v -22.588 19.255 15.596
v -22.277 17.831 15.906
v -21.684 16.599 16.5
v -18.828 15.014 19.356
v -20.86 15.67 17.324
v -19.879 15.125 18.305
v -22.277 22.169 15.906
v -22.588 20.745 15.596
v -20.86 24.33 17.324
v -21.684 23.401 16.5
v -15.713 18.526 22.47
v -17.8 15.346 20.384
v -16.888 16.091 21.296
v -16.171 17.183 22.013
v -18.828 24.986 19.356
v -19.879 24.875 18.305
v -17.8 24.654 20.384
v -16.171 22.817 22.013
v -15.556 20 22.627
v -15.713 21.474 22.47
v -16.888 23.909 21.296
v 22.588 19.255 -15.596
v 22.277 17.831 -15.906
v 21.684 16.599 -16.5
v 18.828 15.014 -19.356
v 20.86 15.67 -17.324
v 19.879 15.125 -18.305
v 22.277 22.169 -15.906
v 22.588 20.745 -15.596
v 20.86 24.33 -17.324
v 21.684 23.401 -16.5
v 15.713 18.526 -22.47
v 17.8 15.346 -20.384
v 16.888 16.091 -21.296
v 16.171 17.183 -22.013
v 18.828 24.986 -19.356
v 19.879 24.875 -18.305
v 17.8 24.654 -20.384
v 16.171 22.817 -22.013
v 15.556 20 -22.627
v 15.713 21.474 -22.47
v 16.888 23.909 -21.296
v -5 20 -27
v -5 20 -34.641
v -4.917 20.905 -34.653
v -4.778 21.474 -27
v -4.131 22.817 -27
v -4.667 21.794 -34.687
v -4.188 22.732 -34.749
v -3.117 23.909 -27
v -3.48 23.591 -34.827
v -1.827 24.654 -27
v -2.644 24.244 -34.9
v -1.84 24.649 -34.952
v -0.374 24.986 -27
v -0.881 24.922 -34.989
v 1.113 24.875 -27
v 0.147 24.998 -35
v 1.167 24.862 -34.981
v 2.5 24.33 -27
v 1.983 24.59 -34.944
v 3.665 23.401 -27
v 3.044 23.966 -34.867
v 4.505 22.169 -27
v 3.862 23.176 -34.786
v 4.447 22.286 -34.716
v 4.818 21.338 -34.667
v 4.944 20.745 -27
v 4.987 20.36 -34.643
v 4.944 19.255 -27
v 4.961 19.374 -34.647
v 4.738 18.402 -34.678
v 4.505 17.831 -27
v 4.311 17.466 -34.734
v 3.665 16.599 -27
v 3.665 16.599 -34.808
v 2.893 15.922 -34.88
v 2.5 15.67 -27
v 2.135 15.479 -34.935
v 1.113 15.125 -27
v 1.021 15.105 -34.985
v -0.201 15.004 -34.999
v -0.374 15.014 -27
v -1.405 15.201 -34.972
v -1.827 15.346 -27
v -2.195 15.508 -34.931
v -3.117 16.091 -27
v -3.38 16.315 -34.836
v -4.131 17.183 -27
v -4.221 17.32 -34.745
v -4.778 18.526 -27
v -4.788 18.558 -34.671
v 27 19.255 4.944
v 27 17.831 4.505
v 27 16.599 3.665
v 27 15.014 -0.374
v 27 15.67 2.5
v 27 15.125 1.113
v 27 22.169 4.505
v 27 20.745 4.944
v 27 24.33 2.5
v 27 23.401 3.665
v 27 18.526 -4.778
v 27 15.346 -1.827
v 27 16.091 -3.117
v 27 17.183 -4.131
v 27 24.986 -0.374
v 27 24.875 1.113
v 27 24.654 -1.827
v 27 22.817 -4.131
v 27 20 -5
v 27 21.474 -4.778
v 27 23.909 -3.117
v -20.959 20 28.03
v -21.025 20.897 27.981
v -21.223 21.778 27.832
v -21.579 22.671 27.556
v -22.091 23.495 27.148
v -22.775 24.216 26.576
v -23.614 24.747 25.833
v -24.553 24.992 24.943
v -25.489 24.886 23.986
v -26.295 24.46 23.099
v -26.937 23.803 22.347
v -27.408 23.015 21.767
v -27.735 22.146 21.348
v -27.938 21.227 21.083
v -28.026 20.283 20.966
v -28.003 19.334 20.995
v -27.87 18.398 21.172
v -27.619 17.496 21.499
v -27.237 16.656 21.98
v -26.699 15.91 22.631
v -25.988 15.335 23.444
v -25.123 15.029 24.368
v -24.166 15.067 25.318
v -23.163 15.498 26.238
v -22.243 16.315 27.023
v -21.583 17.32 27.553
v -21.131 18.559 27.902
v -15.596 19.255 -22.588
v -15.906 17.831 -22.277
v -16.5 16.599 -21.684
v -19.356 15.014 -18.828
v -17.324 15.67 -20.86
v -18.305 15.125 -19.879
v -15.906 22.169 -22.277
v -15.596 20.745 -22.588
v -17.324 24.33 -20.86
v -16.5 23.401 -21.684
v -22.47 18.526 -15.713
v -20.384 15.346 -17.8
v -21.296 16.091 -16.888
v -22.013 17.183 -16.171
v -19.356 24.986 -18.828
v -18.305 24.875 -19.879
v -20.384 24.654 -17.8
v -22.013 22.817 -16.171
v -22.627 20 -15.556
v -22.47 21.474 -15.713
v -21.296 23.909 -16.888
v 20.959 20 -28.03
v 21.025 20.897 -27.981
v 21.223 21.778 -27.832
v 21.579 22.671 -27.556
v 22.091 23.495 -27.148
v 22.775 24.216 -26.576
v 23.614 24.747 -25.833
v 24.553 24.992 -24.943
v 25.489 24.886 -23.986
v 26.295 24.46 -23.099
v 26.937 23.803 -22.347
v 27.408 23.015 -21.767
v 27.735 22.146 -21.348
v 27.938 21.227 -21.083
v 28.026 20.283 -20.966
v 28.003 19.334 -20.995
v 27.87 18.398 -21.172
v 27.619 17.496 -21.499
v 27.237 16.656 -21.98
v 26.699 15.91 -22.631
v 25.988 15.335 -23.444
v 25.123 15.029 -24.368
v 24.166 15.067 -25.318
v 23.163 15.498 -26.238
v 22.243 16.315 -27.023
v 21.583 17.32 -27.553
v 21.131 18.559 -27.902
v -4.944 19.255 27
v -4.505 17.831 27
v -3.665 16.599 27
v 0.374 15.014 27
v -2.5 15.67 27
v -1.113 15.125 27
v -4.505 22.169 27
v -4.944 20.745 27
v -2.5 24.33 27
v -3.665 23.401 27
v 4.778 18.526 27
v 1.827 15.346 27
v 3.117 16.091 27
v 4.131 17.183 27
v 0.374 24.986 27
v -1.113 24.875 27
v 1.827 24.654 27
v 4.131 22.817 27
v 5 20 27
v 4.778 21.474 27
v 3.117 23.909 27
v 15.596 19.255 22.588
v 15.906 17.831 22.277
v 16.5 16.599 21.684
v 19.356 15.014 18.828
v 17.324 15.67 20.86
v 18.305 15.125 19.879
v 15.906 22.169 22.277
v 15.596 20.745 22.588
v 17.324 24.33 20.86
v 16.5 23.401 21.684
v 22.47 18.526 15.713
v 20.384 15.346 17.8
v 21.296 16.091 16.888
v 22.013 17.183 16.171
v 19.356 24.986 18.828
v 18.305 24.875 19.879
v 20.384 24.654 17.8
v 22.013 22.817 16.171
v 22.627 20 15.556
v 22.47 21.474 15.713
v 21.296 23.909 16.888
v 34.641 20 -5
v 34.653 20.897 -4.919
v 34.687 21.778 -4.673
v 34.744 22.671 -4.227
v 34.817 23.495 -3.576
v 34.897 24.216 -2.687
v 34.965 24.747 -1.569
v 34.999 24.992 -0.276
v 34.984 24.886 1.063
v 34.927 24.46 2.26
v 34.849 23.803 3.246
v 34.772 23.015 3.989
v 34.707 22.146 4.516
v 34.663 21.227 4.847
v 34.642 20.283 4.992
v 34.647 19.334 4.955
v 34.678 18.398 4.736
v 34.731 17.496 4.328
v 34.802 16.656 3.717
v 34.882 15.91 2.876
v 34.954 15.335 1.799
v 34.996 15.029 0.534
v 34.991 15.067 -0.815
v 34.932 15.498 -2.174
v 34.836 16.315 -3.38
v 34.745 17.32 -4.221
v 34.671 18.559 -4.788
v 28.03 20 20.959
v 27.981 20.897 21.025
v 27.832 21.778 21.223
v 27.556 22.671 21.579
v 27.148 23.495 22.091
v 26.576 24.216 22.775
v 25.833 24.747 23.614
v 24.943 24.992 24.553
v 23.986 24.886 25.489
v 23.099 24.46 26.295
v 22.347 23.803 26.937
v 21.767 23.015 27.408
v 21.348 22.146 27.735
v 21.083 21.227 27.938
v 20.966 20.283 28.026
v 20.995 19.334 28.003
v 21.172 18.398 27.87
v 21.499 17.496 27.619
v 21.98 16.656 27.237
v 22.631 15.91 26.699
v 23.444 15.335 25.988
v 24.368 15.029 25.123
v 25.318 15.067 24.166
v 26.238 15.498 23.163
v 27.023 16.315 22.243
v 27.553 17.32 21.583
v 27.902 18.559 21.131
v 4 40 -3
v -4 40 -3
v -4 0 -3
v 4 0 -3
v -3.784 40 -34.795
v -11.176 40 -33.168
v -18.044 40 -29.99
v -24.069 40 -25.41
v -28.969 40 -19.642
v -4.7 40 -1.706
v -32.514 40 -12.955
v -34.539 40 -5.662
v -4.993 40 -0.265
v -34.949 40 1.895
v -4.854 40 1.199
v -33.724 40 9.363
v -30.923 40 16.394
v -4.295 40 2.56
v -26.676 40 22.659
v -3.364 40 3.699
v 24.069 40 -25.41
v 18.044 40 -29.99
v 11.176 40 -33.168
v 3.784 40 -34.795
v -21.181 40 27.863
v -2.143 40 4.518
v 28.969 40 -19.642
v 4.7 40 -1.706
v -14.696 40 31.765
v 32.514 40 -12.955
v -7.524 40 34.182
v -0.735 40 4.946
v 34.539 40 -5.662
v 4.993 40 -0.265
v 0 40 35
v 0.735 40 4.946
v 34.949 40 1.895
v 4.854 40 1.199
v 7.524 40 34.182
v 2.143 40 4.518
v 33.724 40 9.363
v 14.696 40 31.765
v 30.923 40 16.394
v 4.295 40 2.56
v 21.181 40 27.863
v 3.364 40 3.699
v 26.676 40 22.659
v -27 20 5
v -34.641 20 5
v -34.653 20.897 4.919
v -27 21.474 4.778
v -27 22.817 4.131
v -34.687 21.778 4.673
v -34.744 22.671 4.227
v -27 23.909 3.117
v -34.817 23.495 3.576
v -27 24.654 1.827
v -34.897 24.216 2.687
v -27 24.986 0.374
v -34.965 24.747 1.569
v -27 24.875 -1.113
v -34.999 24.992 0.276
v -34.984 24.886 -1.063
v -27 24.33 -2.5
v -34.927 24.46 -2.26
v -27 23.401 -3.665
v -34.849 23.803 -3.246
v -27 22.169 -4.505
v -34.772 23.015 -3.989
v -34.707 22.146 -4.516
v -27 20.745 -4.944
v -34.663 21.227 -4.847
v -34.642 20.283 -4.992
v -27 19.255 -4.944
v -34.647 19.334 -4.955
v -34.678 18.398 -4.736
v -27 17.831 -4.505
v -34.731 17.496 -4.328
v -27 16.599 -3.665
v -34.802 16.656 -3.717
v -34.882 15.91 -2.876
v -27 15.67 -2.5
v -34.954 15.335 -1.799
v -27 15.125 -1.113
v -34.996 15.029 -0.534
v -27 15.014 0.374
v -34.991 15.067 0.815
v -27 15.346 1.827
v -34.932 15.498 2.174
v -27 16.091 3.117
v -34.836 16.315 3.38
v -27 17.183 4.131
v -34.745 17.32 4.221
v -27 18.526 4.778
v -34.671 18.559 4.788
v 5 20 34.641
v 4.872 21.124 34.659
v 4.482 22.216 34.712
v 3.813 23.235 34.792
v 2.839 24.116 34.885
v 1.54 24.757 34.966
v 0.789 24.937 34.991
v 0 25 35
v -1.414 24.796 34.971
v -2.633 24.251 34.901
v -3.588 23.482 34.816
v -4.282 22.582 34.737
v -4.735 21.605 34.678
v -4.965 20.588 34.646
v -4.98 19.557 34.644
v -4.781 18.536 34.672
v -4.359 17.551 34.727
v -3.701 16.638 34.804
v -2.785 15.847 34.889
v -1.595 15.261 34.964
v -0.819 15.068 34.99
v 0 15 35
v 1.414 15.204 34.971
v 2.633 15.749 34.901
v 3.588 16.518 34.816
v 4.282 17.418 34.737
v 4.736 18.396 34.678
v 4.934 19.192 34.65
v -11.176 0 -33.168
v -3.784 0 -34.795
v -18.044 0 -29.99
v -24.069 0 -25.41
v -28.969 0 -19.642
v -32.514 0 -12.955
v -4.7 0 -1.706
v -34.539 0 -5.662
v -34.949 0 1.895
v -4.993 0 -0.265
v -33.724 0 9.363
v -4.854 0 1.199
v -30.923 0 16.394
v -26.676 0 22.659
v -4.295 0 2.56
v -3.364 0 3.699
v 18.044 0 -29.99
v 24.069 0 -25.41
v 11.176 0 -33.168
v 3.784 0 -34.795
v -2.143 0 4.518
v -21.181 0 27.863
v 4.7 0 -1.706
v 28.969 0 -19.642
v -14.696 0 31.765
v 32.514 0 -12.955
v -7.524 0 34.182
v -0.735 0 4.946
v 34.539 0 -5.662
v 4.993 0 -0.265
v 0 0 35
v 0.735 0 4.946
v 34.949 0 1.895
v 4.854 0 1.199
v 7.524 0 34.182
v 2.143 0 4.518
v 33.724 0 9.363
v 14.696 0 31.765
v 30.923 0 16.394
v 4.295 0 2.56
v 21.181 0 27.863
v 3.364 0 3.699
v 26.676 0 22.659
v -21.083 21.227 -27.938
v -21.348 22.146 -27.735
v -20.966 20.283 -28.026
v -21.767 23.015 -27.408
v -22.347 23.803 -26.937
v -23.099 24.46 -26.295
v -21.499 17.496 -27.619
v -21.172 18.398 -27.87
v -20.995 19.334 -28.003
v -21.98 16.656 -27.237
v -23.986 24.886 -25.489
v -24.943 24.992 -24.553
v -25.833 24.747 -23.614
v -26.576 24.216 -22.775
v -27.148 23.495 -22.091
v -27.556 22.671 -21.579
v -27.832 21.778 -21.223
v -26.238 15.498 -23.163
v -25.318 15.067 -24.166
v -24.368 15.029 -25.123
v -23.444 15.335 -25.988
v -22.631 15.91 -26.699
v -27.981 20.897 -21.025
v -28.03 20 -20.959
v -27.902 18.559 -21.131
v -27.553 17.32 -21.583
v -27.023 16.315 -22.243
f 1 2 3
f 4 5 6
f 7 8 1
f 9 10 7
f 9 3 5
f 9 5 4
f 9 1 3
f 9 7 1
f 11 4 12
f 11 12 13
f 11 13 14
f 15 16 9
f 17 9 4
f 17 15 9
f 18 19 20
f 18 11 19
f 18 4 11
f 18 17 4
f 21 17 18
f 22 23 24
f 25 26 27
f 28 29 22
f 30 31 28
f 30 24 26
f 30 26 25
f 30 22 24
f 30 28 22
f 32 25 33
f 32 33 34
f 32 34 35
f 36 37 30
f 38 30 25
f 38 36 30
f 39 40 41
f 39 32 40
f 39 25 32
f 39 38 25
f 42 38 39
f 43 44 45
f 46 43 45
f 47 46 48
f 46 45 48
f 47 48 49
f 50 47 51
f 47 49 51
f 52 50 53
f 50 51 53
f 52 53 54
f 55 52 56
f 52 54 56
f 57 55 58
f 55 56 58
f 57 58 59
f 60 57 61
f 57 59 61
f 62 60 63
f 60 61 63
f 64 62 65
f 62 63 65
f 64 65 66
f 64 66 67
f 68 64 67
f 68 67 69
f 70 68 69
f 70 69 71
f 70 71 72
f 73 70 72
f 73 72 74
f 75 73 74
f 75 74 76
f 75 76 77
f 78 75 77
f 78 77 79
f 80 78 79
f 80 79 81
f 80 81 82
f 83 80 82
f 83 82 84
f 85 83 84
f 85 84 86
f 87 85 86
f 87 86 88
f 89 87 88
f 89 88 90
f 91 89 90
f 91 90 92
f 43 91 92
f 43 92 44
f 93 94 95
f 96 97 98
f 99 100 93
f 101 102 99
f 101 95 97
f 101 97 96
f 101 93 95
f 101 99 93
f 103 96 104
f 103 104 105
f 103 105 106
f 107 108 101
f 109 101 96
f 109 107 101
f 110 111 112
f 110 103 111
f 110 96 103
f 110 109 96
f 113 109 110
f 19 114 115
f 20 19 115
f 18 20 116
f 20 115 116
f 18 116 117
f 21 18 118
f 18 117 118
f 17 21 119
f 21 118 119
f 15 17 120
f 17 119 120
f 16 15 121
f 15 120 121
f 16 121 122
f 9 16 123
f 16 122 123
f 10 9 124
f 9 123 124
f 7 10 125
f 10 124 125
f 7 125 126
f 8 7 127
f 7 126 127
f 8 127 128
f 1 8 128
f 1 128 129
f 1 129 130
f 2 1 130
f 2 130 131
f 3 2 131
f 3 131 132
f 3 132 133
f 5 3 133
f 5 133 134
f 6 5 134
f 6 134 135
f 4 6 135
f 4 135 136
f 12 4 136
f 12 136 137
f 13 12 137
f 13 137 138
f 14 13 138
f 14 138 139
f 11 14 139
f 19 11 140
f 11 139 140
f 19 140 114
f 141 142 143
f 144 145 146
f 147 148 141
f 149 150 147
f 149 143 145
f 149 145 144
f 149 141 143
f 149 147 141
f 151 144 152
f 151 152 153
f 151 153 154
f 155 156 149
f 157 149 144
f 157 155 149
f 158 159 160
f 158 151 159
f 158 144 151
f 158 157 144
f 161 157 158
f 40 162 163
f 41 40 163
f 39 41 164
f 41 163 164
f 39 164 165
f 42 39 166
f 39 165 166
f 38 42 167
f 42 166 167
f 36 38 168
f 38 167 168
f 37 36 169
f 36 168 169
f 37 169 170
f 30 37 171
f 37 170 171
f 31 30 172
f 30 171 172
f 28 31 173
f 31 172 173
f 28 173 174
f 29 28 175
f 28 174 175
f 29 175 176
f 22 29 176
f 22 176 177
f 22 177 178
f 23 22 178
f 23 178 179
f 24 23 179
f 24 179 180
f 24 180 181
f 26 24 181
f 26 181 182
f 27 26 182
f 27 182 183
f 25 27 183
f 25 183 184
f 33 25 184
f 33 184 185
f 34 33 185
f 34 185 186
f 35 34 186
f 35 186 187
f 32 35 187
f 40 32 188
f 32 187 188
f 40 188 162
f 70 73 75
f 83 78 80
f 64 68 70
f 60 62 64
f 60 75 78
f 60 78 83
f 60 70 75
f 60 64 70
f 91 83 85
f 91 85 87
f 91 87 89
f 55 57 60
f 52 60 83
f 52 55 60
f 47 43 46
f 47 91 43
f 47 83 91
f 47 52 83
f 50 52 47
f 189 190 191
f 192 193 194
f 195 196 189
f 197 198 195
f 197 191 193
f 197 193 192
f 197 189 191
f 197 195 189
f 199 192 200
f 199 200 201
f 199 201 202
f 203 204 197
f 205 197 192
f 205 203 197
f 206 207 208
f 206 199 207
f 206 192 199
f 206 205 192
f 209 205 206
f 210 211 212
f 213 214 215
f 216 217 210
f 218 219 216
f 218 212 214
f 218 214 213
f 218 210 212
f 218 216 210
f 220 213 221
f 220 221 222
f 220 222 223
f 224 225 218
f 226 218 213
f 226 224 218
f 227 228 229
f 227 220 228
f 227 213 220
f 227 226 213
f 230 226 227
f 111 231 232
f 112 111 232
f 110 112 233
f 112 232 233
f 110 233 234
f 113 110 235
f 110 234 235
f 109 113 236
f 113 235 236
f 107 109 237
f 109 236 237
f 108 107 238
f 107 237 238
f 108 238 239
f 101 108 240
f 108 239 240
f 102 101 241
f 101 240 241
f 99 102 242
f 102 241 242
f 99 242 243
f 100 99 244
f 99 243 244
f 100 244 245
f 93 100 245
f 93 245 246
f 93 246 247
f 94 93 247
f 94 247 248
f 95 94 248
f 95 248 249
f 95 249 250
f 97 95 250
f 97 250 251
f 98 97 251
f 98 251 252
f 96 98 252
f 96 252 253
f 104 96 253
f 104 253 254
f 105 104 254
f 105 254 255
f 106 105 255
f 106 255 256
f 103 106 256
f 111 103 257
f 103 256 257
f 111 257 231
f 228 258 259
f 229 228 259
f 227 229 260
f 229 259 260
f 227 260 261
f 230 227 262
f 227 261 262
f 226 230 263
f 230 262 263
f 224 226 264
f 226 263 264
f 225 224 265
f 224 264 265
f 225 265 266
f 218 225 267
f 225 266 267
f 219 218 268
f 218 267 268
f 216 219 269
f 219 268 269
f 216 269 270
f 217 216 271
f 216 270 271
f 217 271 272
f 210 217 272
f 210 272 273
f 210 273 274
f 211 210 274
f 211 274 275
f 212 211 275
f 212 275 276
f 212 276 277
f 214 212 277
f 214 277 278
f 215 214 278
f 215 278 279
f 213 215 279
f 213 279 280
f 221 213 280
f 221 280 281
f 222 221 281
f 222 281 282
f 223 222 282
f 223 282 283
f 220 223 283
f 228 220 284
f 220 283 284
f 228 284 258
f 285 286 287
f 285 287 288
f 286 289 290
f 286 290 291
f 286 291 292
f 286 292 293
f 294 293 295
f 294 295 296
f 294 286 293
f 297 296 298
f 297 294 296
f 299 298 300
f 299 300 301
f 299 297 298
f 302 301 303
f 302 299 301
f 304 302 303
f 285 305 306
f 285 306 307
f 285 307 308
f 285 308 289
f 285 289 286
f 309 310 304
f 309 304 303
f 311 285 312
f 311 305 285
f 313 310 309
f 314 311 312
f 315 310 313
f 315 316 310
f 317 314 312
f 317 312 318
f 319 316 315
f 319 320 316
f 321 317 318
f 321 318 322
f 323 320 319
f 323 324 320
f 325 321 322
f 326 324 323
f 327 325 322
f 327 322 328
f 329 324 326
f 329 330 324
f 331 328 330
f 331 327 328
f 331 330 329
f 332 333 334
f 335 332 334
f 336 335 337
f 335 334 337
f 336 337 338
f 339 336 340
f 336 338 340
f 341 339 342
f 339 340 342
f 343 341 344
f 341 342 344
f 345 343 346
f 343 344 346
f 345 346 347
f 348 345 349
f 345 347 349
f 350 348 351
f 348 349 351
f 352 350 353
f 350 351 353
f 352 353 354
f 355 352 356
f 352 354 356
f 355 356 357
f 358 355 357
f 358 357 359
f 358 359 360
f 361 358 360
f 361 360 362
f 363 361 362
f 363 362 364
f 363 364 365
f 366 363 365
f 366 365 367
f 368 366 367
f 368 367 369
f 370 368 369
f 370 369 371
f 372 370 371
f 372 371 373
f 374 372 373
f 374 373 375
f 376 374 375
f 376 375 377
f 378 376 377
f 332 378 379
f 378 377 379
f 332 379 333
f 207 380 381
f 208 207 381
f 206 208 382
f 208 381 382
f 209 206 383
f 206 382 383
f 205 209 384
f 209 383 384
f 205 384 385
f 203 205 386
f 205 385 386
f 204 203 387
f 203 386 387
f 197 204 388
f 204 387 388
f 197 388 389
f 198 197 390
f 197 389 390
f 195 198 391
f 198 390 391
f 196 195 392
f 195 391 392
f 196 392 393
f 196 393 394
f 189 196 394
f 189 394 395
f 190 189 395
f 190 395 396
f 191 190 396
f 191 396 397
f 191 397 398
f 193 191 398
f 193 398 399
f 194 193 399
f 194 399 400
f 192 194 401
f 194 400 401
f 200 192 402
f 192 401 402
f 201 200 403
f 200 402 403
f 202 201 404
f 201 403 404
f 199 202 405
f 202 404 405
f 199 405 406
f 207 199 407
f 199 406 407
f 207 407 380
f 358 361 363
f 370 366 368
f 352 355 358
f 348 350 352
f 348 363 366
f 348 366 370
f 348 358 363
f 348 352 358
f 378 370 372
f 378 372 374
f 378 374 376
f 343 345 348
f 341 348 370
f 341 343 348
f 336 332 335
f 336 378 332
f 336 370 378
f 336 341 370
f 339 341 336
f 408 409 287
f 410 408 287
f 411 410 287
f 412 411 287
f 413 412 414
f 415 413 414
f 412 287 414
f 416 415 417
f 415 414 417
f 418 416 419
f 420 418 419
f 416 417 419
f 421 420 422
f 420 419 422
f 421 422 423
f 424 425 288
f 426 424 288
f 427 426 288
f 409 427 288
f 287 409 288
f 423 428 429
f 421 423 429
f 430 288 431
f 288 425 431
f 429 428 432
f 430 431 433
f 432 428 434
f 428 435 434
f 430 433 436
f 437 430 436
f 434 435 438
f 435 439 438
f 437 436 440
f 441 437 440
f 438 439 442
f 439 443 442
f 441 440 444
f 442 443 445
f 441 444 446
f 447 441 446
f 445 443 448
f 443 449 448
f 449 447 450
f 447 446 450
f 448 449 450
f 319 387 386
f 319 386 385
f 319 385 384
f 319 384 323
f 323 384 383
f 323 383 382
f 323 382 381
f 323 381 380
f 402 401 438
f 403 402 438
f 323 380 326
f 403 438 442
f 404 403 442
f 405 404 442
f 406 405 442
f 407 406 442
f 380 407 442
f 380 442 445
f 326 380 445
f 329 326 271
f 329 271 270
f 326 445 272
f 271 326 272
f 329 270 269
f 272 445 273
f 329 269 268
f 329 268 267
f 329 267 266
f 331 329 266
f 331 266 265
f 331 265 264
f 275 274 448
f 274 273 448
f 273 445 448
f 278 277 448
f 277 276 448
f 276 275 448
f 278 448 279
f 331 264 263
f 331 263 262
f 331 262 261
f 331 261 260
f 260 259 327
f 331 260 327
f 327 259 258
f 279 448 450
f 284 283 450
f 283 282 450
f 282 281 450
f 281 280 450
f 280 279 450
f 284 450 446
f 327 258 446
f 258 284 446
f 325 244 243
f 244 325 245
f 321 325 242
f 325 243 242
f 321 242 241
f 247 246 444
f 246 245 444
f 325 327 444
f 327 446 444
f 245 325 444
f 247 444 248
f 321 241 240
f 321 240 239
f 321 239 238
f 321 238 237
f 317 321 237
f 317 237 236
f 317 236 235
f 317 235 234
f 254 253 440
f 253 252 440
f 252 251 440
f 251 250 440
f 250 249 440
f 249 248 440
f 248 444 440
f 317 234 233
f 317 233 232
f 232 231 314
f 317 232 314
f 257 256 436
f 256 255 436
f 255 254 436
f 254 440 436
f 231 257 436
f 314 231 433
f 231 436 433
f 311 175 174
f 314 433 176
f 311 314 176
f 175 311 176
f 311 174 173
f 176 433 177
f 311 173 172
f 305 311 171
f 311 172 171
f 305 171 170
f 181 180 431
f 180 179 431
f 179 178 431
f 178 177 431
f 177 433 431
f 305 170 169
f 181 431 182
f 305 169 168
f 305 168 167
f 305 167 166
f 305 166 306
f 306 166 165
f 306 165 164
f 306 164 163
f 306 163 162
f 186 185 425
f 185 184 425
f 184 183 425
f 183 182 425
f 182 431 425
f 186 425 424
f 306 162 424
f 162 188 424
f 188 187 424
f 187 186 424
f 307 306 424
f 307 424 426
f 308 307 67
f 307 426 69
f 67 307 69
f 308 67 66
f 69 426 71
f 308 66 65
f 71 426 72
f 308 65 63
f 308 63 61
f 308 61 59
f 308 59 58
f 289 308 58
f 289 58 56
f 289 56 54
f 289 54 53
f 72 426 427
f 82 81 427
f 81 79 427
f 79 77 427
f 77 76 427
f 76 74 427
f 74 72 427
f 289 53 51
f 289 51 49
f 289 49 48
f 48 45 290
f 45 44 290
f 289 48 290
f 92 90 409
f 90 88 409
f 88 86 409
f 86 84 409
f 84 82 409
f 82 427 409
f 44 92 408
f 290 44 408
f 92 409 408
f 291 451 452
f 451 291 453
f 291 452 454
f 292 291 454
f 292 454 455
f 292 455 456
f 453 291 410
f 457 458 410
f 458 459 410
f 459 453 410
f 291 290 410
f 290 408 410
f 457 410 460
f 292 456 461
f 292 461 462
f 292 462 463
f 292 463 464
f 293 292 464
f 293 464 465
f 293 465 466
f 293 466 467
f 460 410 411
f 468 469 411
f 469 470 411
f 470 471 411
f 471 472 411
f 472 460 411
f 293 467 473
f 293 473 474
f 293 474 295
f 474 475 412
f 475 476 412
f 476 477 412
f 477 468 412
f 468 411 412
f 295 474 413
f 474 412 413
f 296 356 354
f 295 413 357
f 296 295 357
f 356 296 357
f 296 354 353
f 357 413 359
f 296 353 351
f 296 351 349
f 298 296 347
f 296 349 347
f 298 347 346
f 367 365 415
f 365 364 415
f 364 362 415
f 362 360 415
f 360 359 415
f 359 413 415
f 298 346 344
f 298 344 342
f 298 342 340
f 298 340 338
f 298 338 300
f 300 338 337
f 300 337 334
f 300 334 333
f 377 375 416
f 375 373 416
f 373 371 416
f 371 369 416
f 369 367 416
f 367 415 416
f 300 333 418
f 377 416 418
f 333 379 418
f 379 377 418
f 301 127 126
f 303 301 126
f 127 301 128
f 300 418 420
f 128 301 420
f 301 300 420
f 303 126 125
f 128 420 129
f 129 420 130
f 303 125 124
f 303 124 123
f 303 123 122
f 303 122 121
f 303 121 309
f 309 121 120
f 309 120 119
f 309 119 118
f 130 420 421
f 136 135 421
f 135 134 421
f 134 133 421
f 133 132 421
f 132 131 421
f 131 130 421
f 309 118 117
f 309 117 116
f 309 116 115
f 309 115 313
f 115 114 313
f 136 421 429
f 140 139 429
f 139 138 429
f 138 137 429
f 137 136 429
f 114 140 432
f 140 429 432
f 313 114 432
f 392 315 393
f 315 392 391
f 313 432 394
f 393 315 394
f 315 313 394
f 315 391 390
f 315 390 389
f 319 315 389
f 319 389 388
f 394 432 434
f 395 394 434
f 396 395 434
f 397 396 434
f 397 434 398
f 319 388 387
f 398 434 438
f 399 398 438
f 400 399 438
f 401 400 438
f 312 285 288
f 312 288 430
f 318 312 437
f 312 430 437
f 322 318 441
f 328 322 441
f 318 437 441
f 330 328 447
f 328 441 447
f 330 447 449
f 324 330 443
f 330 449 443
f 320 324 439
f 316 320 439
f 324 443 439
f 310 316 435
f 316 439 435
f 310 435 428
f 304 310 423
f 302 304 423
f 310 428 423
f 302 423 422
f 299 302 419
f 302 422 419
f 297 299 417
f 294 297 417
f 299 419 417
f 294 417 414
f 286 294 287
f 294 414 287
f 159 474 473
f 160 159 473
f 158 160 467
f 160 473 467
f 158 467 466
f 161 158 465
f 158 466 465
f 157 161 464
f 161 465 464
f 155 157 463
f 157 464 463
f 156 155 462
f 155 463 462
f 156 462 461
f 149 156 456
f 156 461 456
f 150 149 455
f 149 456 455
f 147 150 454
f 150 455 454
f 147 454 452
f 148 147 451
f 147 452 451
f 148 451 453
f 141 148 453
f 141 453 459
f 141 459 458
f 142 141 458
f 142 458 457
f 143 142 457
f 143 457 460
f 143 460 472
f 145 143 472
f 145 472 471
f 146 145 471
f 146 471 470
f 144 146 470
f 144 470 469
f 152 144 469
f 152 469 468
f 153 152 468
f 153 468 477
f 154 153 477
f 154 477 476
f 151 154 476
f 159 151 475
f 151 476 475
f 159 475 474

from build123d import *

# Parameters (mm, degrees)
SKETCH1_R           = 35
BOSS_EXTRUDE1_DEPTH = 40
SKETCH7_R           = 5
CUT_EXTRUDE4_DEPTH  = 8
CIRPATTERN1_COUNT   = 8


with BuildPart() as part:
    # Sketch1 → Boss-Extrude1 (new body)
    with BuildSketch(Plane(origin=(0, 0, 0), x_dir=(1, 0, 0), z_dir=(0, 1, 0))):
        with Locations(Location((0, 0, 0), (0, 0, 270))):
            Circle(SKETCH1_R)
        with BuildLine():
            Line((-4, 3), (4, 3))
            ThreePointArc((4, 3), (0, -5), (-4, 3))
        make_face(mode=Mode.SUBTRACT)
    extrude(amount=BOSS_EXTRUDE1_DEPTH)

    # Sketch7 → Cut-Extrude4 (cut)
    with BuildSketch(Plane(origin=(0, 0, -35), x_dir=(-1, 0, 0), z_dir=(0, 0, -1))):
        with Locations((0, 20)):
            Circle(SKETCH7_R)
    cut_extrude4 = extrude(amount=-CUT_EXTRUDE4_DEPTH, mode=Mode.SUBTRACT)

    # CirPattern1: Cut-Extrude4 ×8 about axis
    cirpattern1_axis = Axis((0, 0, 0), (0, 1, 0))
    for i in range(1, CIRPATTERN1_COUNT):
        add(cut_extrude4.rotate(cirpattern1_axis, i * 360 / CIRPATTERN1_COUNT), mode=Mode.SUBTRACT)


solid = part.part
